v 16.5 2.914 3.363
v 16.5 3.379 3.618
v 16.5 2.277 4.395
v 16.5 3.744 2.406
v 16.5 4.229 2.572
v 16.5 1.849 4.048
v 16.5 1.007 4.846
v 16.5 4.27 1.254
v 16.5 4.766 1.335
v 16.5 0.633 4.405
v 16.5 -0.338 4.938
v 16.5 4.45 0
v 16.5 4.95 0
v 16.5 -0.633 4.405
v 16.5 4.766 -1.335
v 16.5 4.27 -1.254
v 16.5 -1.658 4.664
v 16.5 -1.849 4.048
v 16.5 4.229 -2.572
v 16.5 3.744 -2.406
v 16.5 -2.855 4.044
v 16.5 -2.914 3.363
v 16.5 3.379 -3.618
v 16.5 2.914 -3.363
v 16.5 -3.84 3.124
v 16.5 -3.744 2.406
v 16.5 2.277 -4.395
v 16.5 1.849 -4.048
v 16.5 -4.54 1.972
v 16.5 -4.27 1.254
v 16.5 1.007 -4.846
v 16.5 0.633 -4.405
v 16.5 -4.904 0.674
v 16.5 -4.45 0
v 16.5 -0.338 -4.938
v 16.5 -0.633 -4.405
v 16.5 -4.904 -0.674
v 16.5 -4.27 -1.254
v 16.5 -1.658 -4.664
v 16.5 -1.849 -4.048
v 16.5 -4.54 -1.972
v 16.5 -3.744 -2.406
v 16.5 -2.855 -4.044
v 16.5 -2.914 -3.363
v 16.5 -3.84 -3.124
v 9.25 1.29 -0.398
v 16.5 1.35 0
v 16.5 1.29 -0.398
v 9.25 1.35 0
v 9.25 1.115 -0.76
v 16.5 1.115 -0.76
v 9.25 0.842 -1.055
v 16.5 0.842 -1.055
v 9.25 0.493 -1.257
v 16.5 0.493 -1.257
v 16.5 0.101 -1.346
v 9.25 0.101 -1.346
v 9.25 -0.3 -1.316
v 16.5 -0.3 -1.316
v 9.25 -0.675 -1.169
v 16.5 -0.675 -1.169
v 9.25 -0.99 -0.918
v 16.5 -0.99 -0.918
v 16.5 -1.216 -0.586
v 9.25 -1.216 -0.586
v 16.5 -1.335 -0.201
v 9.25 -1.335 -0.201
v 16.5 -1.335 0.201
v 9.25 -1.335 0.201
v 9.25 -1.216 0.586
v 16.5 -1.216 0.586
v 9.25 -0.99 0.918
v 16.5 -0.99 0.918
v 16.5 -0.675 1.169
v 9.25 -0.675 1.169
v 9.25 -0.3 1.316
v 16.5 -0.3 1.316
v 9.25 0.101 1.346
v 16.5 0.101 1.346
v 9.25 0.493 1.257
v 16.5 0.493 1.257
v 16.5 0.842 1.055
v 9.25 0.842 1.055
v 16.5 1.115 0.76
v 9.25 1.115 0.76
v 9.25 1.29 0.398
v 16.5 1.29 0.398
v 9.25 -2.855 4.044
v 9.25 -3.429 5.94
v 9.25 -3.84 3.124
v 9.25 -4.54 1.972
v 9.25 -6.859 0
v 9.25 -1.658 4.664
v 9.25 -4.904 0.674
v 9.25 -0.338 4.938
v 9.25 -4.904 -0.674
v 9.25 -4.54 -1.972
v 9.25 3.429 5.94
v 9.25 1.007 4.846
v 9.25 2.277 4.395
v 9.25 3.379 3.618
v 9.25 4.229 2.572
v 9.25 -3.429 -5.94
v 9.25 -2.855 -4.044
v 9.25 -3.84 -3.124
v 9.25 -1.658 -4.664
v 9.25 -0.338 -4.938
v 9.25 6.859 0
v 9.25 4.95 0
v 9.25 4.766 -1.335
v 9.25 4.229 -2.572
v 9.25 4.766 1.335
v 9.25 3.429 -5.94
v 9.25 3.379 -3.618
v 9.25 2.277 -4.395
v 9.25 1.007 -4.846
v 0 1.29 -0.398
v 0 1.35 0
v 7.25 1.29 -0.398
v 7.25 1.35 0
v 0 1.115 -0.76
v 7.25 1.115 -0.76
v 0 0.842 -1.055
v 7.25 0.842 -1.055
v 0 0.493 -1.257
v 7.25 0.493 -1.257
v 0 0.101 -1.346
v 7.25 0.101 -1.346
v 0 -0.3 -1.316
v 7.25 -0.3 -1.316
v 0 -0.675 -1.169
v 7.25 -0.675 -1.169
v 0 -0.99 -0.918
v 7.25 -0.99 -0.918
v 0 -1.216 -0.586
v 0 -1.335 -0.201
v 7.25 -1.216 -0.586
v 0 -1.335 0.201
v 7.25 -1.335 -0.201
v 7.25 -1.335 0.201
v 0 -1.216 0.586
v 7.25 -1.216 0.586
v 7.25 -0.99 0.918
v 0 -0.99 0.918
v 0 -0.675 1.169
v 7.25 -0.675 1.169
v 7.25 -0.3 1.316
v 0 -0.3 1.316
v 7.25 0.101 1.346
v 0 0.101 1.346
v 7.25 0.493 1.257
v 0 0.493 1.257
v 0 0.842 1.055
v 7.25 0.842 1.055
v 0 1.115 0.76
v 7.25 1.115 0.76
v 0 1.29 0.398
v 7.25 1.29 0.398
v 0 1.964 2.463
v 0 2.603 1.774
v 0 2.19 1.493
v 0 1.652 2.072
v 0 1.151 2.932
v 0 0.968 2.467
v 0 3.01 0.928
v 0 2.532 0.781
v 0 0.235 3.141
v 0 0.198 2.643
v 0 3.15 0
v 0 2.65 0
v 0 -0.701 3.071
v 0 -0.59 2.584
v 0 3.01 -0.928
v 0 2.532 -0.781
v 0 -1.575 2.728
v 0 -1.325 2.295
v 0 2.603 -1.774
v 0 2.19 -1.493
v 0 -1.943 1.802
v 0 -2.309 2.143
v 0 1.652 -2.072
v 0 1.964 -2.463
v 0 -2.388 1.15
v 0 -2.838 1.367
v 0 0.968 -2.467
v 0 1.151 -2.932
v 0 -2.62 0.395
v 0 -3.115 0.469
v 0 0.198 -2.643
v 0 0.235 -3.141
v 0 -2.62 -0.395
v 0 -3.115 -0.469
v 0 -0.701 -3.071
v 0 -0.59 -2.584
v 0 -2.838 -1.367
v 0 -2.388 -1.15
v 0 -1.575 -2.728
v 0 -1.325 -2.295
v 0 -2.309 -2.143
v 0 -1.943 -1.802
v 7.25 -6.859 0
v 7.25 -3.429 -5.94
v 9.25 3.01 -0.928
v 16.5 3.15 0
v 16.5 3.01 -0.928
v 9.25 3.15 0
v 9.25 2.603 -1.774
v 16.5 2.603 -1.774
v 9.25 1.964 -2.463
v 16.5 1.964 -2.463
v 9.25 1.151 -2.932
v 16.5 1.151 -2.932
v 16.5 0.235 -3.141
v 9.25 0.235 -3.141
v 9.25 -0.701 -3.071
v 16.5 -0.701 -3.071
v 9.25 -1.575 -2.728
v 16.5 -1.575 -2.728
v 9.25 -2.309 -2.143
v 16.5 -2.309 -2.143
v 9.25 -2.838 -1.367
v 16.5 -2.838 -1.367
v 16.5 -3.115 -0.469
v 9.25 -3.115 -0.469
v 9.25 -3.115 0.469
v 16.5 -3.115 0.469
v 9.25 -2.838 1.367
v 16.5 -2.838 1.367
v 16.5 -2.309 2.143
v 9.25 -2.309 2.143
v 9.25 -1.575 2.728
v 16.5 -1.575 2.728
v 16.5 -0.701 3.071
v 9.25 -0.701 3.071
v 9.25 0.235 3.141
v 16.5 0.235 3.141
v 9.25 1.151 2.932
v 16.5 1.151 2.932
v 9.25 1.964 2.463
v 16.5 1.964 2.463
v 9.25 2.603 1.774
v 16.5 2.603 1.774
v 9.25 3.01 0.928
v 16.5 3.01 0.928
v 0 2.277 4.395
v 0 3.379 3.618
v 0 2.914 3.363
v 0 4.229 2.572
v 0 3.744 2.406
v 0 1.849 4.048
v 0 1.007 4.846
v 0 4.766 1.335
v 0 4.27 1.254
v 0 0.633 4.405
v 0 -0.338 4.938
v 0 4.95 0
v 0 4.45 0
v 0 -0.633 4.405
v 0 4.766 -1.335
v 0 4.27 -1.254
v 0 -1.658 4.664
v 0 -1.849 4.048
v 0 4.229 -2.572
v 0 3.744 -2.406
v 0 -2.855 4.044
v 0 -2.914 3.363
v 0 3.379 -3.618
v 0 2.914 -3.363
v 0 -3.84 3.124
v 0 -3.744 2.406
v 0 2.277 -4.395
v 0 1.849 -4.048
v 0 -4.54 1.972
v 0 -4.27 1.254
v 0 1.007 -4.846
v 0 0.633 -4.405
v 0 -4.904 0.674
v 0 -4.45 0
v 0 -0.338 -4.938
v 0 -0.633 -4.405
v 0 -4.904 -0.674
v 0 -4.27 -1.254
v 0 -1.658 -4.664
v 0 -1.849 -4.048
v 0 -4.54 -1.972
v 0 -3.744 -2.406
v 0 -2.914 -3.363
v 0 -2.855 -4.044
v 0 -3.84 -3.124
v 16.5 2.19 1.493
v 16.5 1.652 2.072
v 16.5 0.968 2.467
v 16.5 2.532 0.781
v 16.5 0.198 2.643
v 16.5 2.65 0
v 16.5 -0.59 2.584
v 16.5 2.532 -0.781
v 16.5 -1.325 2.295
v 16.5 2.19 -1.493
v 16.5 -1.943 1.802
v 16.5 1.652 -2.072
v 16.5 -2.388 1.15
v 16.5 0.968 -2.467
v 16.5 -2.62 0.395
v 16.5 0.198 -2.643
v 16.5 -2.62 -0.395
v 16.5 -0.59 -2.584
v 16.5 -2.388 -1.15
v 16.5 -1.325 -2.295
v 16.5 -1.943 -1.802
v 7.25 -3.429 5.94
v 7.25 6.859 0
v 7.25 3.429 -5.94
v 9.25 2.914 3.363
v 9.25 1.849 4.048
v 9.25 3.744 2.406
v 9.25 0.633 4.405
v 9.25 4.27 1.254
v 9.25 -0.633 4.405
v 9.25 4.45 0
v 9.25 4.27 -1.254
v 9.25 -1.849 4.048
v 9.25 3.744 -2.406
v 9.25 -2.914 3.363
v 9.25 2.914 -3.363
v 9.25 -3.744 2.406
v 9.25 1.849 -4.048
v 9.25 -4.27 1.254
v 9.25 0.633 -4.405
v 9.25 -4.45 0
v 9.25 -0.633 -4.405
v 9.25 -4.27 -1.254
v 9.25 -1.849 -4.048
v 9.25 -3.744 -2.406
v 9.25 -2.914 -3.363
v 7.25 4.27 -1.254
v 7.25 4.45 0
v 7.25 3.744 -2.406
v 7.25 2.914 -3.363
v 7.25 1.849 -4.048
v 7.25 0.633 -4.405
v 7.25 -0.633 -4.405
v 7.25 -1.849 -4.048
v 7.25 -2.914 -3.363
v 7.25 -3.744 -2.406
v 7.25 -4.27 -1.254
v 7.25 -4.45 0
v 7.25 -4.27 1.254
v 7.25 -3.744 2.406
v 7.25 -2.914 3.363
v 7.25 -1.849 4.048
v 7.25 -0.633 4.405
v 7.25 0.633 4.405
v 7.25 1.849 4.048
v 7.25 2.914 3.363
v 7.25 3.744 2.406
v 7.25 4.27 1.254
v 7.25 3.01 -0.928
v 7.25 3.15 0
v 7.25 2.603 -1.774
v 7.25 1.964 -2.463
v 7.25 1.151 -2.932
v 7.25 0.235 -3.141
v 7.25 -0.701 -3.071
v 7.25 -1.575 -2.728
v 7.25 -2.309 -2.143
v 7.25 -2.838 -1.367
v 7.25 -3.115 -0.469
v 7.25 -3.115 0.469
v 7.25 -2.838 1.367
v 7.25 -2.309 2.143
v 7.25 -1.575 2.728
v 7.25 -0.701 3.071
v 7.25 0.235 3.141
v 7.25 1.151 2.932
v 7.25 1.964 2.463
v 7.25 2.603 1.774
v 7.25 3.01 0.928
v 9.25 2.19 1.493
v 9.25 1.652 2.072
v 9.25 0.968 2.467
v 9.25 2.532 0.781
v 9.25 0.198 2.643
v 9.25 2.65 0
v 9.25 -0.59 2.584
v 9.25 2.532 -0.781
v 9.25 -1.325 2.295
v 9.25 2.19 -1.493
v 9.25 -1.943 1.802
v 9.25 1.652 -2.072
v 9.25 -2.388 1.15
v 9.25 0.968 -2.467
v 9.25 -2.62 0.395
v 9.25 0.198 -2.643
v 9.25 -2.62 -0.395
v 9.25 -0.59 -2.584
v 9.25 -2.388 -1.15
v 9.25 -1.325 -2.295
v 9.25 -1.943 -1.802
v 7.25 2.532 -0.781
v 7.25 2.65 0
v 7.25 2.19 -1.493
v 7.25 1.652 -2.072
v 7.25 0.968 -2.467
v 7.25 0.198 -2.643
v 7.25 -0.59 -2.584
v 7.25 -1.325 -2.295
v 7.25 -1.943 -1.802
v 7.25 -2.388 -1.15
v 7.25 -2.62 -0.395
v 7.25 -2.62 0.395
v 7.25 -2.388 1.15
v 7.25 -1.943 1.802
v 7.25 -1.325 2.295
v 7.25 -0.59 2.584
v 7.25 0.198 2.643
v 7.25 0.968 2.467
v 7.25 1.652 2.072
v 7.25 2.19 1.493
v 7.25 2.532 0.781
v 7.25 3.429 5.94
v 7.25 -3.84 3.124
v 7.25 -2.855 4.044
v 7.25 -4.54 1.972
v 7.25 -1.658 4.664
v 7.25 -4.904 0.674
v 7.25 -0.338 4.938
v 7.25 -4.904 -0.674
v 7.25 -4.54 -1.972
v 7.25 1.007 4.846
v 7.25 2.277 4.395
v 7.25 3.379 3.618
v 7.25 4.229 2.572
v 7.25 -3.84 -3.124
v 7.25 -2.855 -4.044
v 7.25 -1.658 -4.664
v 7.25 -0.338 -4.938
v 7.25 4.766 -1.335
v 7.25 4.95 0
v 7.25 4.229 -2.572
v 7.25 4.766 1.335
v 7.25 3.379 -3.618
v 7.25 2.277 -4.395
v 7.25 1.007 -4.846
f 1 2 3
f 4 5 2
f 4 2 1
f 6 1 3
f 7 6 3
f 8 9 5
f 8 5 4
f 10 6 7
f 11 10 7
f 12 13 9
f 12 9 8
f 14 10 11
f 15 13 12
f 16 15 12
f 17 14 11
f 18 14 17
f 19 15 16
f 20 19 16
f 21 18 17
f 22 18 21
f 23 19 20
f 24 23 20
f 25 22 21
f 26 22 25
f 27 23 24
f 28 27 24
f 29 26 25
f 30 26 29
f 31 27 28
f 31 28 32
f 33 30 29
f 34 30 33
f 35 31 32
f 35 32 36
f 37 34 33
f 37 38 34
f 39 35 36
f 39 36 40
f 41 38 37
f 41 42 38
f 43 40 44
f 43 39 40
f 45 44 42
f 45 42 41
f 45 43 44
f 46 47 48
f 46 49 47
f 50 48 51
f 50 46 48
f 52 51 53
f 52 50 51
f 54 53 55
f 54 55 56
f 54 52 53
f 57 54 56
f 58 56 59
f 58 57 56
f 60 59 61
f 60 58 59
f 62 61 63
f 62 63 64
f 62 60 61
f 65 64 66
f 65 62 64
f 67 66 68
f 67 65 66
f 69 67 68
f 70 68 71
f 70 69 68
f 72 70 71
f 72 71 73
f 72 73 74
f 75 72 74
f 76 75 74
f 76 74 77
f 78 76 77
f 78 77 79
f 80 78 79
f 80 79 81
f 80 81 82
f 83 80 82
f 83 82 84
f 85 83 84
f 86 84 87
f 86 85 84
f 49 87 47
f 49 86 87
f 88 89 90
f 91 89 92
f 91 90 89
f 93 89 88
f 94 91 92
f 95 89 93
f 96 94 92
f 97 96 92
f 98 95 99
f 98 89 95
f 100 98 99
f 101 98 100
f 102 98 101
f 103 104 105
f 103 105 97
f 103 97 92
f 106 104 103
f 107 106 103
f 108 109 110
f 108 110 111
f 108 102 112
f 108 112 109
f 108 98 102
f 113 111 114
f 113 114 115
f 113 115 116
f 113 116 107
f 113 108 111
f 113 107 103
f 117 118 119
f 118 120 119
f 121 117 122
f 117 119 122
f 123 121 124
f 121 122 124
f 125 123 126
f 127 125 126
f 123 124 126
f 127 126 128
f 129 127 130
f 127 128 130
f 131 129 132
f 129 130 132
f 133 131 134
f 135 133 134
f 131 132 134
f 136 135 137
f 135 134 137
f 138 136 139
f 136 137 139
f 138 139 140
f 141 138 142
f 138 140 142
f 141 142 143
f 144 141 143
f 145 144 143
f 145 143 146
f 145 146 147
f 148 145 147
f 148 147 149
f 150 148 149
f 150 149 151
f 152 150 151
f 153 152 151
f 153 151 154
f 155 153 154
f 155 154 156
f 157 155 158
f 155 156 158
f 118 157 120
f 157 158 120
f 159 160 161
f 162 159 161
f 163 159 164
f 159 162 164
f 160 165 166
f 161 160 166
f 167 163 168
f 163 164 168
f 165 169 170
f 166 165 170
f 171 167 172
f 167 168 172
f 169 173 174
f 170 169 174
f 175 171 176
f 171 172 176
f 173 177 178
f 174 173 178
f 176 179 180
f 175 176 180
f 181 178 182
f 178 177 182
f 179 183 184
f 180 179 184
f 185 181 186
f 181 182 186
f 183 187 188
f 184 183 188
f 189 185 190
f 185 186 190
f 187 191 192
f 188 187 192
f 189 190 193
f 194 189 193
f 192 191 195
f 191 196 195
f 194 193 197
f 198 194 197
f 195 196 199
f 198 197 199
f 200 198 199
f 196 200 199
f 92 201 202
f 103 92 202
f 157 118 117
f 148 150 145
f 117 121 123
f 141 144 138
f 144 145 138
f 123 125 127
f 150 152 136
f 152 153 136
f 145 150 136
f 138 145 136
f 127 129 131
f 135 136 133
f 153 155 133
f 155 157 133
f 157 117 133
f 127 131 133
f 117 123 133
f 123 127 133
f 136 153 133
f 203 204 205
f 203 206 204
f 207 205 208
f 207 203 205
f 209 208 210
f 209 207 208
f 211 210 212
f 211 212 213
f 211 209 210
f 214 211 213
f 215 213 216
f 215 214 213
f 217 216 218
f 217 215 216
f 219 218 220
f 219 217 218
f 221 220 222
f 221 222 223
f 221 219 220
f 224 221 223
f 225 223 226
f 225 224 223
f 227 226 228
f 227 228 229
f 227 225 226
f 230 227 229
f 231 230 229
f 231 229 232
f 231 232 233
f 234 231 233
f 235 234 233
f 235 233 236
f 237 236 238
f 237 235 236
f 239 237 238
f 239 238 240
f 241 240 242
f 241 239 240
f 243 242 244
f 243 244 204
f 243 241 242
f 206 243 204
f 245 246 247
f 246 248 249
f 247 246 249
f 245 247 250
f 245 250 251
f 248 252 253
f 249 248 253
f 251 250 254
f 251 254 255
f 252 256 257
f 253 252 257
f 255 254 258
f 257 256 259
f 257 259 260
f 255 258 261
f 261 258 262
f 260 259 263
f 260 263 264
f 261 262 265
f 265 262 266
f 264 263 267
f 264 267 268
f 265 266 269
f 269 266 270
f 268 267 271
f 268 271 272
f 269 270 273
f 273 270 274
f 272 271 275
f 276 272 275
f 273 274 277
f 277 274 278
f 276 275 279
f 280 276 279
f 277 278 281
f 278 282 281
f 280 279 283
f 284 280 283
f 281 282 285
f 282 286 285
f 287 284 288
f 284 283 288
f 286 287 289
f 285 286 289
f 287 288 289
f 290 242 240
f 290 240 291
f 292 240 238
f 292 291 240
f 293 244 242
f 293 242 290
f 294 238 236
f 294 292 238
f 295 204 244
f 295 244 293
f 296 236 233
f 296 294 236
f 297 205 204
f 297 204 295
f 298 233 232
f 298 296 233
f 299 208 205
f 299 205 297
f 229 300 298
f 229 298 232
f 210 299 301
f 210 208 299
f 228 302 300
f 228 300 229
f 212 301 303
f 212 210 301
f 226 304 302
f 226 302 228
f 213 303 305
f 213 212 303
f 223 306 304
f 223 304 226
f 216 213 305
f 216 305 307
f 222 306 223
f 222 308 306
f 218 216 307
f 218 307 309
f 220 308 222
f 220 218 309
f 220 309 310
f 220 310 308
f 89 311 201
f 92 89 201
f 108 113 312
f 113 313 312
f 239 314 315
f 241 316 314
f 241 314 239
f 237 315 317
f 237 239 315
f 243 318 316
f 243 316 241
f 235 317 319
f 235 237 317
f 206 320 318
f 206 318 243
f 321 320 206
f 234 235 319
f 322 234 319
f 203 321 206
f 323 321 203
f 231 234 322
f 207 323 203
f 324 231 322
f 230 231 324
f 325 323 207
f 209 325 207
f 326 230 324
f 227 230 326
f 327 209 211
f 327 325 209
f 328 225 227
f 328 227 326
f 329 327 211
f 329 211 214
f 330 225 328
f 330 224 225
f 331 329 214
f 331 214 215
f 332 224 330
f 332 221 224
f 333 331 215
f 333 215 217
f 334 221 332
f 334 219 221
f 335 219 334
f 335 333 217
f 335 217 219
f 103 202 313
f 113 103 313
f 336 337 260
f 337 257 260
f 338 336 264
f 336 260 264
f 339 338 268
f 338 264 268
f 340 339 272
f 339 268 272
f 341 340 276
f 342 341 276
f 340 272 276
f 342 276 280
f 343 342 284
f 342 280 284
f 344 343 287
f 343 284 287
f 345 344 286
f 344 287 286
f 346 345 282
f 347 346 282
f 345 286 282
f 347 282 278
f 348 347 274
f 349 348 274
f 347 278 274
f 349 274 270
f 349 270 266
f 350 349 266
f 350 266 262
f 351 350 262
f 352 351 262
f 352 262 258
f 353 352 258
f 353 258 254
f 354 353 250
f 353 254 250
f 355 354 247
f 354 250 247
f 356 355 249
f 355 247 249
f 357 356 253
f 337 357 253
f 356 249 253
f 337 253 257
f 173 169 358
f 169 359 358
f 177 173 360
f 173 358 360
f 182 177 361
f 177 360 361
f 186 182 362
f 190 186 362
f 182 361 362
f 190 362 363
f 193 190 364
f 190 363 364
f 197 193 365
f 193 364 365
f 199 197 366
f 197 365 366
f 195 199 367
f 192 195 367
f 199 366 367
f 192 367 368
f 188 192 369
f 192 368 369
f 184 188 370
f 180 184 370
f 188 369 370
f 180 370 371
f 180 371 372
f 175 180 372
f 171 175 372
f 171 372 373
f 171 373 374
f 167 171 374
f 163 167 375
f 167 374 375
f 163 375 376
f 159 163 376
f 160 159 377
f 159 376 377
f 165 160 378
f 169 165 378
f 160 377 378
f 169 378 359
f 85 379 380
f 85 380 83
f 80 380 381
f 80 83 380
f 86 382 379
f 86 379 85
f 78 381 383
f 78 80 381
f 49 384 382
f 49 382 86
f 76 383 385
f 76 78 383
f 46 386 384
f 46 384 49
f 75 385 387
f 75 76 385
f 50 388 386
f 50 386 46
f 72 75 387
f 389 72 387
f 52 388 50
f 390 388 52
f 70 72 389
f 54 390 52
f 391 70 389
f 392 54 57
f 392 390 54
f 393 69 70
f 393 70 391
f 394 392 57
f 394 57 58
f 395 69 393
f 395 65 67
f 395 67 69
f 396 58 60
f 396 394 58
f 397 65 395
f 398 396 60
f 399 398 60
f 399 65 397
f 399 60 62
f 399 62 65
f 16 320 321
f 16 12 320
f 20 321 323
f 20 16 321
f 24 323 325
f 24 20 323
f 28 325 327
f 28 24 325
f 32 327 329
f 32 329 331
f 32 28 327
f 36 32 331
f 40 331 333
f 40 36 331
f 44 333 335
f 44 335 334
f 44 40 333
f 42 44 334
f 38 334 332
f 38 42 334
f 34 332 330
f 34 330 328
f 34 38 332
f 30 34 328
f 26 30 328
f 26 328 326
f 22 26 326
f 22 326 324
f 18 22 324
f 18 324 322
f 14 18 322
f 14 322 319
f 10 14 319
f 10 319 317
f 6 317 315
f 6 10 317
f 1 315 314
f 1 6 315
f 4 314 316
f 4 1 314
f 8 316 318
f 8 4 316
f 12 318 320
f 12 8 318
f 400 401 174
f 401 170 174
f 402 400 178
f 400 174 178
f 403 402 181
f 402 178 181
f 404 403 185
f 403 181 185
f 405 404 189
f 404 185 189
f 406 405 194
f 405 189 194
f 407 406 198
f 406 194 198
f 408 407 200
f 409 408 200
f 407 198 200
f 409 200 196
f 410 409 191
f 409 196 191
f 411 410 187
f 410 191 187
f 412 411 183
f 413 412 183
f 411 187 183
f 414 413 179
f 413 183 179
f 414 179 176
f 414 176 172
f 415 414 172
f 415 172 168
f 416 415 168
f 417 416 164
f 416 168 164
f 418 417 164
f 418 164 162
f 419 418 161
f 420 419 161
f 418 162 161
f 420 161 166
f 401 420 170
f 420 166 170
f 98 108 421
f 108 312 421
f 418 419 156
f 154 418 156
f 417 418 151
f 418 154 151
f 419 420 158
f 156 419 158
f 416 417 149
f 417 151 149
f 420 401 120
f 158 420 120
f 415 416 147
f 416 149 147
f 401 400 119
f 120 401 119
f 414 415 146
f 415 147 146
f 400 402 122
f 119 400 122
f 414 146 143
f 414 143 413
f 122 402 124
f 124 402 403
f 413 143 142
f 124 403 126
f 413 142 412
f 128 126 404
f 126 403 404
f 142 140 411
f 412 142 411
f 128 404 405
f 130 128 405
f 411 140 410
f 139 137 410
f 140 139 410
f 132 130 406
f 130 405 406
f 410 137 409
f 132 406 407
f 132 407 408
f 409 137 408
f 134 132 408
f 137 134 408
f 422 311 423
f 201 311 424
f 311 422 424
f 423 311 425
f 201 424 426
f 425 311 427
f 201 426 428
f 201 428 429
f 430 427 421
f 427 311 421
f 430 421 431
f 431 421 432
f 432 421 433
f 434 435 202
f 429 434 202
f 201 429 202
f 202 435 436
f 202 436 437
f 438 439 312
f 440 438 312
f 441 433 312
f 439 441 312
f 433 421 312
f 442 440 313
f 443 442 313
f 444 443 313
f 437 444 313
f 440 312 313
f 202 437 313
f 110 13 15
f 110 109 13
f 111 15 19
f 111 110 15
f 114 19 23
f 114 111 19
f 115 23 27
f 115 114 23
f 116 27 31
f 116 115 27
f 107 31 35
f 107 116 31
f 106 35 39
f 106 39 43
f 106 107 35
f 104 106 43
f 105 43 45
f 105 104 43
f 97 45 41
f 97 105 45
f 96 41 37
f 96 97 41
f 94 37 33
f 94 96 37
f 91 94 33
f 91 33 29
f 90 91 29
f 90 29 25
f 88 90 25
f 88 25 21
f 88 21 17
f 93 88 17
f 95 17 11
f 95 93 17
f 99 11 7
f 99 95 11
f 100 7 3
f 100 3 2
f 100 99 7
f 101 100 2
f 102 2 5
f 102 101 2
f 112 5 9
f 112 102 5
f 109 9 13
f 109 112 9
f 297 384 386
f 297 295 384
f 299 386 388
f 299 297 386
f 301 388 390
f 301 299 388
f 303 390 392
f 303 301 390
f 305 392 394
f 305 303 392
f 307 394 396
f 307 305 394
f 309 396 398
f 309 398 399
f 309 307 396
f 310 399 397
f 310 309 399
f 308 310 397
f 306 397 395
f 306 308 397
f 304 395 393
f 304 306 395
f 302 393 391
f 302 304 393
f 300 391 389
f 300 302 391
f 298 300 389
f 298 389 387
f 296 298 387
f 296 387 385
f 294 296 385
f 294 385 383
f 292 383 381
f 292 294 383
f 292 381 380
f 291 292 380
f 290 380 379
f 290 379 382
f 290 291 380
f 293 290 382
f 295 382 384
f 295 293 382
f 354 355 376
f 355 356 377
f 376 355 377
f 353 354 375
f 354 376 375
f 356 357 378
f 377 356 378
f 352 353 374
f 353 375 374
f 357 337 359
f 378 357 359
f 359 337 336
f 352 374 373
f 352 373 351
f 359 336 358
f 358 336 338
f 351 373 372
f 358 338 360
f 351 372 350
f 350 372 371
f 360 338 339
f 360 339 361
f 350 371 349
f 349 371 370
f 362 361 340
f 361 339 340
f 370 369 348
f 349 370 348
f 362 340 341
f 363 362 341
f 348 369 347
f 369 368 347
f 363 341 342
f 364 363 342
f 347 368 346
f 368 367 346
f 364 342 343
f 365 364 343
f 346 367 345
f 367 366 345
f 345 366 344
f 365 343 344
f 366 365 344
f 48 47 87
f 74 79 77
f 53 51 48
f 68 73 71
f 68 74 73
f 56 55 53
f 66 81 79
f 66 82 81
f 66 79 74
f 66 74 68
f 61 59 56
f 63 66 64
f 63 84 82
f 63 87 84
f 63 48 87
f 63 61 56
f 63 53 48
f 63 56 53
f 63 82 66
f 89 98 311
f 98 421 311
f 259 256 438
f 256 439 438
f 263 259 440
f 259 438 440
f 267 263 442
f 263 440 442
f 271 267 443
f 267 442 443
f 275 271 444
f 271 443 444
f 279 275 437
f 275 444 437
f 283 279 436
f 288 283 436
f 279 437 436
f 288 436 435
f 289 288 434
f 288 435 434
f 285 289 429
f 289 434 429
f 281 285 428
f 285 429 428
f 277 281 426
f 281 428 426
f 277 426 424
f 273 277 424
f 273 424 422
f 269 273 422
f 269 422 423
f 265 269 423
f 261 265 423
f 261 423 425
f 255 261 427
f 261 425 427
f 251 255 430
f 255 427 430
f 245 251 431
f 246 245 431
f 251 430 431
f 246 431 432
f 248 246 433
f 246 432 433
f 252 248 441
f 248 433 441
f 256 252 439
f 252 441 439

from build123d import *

# Parameters (mm, degrees)
BOSS_EXTRUDE1_DEPTH = 1


with BuildPart() as part:
    # Sketch1 → Revolve1 (revolve)
    with BuildSketch(Plane.XY):
        Polygon((0, 0), (0, 1.35), (7.25, 1.35), (7.25, 2.65), (0, 2.65), (0, 3.15), (7.25, 3.15), (7.25, 4.45), (0, 4.45), (0, 4.95), (7.25, 4.95), (7.25, 5.85), (8.25, 5.85), (8.25, 0), align=None)
    revolve(axis=Axis((8.25, 0, 0), (-1, 0, 0)))

    # Sketch2 → Boss-Extrude1 (add)
    with BuildSketch(Plane(origin=(8.25, 0, 0), x_dir=(0, 0, -1), z_dir=(1, 0, 0))):
        Polygon((5.94, -3.429460599), (5.94, 3.429460599), (0, 6.858921198), (-5.94, 3.429460599), (-5.94, -3.429460599), (0, -6.858921198), align=None)
    extrude(amount=-BOSS_EXTRUDE1_DEPTH)

    # Mirror1: part across face


with BuildPart() as part_1:
    add(part.part)
    add(part.part.mirror(Plane(origin=(8.25, 0, 0), x_dir=(0, 0, 1), z_dir=(1, 0, 0))))


solid = part_1.part
